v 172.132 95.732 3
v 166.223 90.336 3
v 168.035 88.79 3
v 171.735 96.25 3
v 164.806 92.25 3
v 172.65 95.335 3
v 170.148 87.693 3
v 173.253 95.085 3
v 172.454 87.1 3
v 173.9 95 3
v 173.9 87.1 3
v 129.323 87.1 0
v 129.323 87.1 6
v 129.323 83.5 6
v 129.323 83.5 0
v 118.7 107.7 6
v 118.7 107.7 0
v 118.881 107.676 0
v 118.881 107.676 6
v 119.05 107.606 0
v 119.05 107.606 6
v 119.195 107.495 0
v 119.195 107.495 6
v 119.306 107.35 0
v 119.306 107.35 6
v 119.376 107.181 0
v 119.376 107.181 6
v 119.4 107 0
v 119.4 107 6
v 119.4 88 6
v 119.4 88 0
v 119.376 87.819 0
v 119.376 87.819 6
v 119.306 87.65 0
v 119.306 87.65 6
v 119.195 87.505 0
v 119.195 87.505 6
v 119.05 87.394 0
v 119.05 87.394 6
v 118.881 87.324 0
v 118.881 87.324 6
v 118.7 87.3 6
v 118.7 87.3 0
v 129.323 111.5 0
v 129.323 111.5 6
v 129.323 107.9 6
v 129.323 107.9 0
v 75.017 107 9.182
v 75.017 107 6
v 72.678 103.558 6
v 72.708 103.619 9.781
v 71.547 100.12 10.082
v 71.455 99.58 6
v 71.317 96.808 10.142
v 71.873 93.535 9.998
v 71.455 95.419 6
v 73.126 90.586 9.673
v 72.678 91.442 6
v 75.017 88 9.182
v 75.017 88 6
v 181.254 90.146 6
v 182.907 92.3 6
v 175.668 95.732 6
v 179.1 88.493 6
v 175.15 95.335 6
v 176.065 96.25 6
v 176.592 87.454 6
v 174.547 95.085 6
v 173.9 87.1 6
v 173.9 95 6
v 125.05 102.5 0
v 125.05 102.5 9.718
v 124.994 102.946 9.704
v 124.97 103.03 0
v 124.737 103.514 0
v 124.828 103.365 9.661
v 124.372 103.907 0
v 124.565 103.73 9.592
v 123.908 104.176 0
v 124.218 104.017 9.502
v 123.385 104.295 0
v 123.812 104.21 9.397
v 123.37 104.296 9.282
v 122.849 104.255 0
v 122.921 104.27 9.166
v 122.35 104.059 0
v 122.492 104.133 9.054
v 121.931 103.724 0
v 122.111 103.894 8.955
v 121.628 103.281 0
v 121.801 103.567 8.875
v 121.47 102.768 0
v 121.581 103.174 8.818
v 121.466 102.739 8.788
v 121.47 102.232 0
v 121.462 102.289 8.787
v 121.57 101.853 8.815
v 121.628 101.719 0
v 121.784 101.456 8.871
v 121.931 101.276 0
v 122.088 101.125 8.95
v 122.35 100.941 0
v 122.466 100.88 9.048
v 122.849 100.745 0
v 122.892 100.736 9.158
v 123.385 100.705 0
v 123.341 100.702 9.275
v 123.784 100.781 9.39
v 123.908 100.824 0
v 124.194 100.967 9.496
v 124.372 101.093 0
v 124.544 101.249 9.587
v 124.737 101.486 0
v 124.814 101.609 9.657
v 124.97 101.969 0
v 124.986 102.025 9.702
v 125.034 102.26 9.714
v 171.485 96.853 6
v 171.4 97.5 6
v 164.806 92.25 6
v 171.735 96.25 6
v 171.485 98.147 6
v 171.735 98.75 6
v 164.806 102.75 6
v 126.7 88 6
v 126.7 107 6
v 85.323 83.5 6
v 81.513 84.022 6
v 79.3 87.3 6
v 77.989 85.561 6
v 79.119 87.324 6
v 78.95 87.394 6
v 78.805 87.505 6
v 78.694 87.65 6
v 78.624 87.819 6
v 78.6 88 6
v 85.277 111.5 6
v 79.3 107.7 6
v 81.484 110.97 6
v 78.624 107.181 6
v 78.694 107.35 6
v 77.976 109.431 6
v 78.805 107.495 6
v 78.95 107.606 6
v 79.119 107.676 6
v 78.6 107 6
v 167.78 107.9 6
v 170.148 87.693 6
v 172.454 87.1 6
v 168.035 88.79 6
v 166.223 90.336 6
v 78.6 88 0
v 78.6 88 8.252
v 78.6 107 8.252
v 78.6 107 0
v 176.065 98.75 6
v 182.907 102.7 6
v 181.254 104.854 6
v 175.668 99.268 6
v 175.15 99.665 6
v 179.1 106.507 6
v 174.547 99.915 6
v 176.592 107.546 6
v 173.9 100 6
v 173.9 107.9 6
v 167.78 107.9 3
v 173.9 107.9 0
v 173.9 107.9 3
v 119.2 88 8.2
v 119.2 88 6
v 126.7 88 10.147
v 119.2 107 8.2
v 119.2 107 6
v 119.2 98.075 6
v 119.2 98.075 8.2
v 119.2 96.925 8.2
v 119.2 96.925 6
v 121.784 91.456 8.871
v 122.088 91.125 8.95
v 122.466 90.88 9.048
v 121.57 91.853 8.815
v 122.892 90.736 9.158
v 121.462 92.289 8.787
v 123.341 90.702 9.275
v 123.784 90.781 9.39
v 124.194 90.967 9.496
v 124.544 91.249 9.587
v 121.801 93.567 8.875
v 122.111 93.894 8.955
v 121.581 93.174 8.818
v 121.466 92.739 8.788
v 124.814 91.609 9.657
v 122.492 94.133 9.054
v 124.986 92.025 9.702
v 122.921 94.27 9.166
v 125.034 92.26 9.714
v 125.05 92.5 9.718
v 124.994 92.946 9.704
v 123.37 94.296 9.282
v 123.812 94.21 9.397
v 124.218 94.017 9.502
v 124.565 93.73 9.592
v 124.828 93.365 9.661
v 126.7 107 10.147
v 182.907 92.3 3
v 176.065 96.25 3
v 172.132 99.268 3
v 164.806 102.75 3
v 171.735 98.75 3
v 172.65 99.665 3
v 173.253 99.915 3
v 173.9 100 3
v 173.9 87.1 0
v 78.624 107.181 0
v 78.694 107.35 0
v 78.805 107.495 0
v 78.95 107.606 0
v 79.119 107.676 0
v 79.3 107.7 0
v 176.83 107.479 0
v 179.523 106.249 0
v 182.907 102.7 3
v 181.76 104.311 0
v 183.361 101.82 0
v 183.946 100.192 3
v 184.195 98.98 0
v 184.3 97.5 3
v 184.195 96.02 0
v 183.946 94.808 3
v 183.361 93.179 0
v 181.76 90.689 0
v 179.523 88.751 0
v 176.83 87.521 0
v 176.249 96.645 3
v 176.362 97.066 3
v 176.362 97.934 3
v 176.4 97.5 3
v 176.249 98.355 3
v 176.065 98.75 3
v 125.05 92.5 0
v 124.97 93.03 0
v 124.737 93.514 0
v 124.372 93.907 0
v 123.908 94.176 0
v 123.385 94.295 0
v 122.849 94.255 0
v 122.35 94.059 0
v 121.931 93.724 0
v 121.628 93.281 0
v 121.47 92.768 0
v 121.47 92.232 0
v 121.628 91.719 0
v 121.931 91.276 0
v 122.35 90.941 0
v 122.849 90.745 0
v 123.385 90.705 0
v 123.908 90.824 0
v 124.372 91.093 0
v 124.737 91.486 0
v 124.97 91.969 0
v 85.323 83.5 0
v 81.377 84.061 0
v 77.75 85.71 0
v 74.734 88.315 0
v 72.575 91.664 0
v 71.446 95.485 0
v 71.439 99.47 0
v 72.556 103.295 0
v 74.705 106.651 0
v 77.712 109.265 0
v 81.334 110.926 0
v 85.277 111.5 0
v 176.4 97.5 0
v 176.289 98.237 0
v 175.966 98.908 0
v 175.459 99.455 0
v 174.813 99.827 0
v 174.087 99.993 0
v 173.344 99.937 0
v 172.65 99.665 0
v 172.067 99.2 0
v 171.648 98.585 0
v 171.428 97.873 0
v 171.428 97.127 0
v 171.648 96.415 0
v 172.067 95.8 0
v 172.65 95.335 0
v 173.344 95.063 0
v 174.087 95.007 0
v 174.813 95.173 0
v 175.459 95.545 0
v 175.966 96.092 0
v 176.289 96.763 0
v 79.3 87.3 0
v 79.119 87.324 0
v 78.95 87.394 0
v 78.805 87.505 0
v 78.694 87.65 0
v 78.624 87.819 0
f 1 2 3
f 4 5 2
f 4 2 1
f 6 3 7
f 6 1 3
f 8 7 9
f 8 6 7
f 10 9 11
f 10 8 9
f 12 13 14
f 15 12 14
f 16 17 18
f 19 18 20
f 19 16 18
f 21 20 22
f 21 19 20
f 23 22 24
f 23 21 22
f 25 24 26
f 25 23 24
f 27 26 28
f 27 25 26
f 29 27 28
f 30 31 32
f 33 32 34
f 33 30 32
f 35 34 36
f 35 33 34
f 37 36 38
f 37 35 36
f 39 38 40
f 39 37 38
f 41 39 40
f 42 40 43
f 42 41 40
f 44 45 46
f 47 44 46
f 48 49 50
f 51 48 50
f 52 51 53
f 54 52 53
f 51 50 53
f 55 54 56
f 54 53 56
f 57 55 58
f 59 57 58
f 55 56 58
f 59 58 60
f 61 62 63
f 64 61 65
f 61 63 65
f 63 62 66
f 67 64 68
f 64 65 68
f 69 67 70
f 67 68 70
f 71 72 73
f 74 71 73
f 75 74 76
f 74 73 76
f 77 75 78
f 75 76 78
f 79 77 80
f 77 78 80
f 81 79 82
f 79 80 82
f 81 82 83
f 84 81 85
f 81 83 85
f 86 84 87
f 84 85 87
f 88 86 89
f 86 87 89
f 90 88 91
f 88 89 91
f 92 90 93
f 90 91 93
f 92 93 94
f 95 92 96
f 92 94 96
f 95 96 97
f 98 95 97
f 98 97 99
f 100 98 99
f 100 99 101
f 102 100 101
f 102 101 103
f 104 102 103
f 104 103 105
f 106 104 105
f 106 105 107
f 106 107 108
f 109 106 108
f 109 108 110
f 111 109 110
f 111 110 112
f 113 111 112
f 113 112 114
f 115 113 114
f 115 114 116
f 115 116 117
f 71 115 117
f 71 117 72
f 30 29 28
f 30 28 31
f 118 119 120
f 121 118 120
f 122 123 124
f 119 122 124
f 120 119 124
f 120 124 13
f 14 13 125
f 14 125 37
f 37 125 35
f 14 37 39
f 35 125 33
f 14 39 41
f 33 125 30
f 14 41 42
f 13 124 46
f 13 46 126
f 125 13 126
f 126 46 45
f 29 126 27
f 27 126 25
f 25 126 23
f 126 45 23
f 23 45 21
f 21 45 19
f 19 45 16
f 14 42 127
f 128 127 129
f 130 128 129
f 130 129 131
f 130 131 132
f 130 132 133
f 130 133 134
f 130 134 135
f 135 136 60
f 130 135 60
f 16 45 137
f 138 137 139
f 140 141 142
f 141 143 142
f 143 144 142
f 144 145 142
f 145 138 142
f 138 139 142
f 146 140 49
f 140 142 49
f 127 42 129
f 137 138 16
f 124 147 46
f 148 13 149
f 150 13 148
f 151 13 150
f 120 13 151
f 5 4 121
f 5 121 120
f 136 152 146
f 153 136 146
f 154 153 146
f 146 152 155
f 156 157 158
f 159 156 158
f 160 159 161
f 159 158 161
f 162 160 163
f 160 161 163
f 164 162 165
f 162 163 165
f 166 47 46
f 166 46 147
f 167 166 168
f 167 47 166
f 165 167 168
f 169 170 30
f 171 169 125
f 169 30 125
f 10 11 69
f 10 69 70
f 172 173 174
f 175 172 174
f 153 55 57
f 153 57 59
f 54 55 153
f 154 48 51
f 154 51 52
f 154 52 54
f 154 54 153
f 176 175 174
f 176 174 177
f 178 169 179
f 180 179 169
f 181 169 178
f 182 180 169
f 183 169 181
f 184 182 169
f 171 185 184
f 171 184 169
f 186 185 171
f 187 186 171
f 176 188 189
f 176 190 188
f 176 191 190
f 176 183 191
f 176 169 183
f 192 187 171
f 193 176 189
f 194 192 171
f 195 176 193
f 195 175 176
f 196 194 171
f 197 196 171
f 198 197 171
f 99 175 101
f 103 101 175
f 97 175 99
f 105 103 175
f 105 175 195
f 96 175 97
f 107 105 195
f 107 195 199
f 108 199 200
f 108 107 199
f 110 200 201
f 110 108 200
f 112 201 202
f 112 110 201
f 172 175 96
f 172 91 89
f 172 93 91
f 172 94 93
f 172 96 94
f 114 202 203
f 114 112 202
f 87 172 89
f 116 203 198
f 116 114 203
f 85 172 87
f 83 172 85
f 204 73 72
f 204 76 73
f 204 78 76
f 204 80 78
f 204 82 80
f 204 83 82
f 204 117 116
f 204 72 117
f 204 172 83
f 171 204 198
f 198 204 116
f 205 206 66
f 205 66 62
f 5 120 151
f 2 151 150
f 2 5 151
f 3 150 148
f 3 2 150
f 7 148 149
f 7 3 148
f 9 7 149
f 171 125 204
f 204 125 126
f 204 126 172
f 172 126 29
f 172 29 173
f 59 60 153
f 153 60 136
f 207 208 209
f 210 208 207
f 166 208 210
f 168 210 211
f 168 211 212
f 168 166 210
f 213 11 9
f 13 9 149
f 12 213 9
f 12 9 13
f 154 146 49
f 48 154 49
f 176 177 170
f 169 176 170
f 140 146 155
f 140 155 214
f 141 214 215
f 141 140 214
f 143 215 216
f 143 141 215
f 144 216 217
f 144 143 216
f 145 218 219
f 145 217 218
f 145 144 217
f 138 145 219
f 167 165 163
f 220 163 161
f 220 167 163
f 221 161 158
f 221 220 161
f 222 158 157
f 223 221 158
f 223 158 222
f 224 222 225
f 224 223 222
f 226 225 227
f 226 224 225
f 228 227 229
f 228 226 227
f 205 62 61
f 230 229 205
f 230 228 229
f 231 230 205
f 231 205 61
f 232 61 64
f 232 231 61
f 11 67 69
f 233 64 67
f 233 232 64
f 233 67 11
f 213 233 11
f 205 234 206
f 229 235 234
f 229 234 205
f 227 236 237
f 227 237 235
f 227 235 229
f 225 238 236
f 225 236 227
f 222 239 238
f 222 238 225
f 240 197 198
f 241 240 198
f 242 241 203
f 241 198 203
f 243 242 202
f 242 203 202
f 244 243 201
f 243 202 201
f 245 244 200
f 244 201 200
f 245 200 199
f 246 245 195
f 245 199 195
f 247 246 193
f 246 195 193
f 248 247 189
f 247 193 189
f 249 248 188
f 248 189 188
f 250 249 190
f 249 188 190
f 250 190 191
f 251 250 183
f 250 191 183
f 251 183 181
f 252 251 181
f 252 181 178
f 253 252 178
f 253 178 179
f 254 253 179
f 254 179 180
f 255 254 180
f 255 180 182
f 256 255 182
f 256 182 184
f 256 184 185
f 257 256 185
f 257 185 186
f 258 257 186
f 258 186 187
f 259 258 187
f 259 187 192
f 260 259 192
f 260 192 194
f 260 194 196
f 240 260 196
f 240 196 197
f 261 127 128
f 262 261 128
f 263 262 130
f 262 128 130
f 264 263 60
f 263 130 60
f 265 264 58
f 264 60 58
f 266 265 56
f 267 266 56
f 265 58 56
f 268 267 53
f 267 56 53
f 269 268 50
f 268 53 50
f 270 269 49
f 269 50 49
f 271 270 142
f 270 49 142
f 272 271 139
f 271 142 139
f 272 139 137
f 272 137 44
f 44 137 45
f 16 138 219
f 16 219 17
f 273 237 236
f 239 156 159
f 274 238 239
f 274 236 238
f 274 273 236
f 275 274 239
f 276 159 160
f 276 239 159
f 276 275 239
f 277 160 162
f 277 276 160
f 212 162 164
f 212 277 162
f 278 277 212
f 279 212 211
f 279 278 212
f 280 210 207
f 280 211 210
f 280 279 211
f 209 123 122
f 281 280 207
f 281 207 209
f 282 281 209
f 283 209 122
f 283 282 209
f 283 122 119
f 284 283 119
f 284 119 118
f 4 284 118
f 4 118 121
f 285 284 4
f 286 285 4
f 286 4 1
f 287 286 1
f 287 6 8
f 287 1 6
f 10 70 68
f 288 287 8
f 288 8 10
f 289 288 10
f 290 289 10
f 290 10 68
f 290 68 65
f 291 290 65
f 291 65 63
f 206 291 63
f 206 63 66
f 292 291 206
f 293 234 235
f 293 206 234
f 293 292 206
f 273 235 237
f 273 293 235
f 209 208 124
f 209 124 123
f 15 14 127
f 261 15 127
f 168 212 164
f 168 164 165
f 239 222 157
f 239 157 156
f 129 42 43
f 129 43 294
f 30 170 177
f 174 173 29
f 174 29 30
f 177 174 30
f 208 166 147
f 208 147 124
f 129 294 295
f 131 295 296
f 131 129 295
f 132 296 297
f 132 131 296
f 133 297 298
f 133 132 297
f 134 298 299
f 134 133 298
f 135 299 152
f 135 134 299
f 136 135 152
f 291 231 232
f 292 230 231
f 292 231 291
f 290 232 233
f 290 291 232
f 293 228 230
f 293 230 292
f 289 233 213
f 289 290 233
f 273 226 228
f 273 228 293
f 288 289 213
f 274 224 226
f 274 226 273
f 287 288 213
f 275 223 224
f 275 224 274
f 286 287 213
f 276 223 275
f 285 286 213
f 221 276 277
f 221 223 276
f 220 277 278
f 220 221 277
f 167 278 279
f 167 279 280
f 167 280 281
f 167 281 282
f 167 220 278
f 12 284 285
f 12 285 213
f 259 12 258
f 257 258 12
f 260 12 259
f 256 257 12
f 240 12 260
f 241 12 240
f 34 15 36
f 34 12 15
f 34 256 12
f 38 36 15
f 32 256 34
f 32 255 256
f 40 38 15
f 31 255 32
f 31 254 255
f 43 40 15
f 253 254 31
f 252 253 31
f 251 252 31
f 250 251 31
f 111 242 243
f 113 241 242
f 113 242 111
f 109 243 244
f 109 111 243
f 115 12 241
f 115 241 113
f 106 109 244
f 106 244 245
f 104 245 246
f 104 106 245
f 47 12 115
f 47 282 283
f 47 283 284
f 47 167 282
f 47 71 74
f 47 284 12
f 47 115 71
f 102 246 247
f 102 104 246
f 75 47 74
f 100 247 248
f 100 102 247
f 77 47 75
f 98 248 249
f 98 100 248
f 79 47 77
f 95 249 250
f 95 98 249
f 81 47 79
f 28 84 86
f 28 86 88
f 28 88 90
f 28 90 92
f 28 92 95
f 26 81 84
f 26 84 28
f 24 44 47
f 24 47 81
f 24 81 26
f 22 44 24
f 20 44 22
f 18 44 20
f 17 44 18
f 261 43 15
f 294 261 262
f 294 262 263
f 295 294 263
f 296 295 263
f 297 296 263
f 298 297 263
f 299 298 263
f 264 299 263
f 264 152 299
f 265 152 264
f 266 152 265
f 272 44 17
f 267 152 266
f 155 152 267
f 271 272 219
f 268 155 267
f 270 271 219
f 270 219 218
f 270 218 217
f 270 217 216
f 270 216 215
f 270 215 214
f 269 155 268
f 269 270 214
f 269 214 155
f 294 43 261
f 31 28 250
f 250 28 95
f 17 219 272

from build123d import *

# Parameters (mm, degrees)
SKETCH1_R            = 2.5
BOSS_EXTRUDE1_DEPTH  = 6
CUT_EXTRUDE4_START   = -3
CUT_EXTRUDE4_DEPTH   = 3
BOSS_EXTRUDE3_START  = -6
BOSS_EXTRUDE3_DEPTH  = 6
BOSS_EXTRUDE4_DEPTH  = 6
CUT_EXTRUDE8_DEPTH   = 216.487496567
BOSS_EXTRUDE5_REACH  = 217.487
M3_CLEARANCE_HOLE2_D = 3.6
BOSS_EXTRUDE6_REACH  = 217.487


with BuildPart() as part:
    # Sketch1 → Boss-Extrude1 (new body)
    with BuildSketch(Plane.XY):
        with BuildLine():
            Line((173.900000276, 87.099556458), (88.800000276, 87.099467009))
            ThreePointArc((88.800000276, 87.099467009), (78.399532162, 97.499935123), (88.800000276, 107.900403236))
            Line((88.800000276, 107.900403236), (173.900000276, 107.900313787))
            ThreePointArc((173.900000276, 107.900313787), (184.30037894, 97.499940589), (173.900000276, 87.099556458))
        make_face()
        with Locations((88.800000276, 97.499935123)):
            Circle(SKETCH1_R, mode=Mode.SUBTRACT)
        with Locations((173.900000276, 97.499935123)):
            Circle(SKETCH1_R, mode=Mode.SUBTRACT)
    extrude(amount=BOSS_EXTRUDE1_DEPTH)

    # Sketch2 → Cut-Extrude4 (cut)
    with BuildSketch(Plane.XY.offset(6).offset(CUT_EXTRUDE4_START)):
        with BuildLine():
            ThreePointArc((176.065063128, 98.749936261), (176.400000276, 97.499936437), (176.065064442, 96.249936261))
            Line((176.065064442, 96.249936261), (182.993597708, 92.24975057))
            ThreePointArc((182.993597708, 92.24975057), (184.40037894, 97.499940641), (182.993592189, 102.750129234))
            Line((182.993592189, 102.750129234), (176.065063128, 98.749936261))
        make_face()
        with BuildLine():
            ThreePointArc((164.806408362, 92.249741011), (168.649815723, 88.406337691), (173.900005794, 86.999556458))
            Line((173.900005794, 86.999556458), (173.90000159, 94.999935123))
            ThreePointArc((173.90000159, 94.999935123), (172.650001414, 95.334870956), (171.734937423, 96.249933985))
            Line((171.734937423, 96.249933985), (164.806408362, 92.249741011))
        make_face()
        with BuildLine():
            Line((173.899998962, 99.999935123), (173.899994757, 108.000313787))
            Line((173.899994757, 108.000313787), (167.779868906, 107.90032022))
            Line((167.779868906, 107.90032022), (164.806402844, 102.750119676))
            Line((164.806402844, 102.750119676), (171.73493611, 98.749933985))
            ThreePointArc((171.73493611, 98.749933985), (172.649999138, 99.664997975), (173.899998962, 99.999935123))
        make_face()
    extrude(amount=CUT_EXTRUDE4_DEPTH, mode=Mode.SUBTRACT)

    # Sketch4 → Boss-Extrude3 (add)
    with BuildSketch(Plane.XY.offset(6).offset(BOSS_EXTRUDE3_START)):
        with BuildLine():
            Line((85.800000276, 107.900403236), (88.800000276, 107.900403236))
            ThreePointArc((88.800000276, 107.900403236), (78.399532162, 97.499935123), (88.800000276, 87.099467009))
            Line((88.800000276, 87.099467009), (85.800000276, 87.099467009))
            ThreePointArc((85.800000276, 87.099467009), (75.399532162, 97.499935123), (85.800000276, 107.900403236))
        make_face()
    extrude(amount=BOSS_EXTRUDE3_DEPTH)

    # Sketch9 → Boss-Extrude4 (add)
    with BuildSketch(Plane.XY.offset(6)):
        with BuildLine():
            Line((85.2774961, 111.499917036), (129.322504452, 111.499917036))
            Line((129.322504452, 111.499917036), (129.322504452, 83.49995321))
            Line((129.322504452, 83.49995321), (85.322504452, 83.49995321))
            ThreePointArc((85.322504452, 83.49995321), (71.300018363, 97.477430947), (85.2774961, 111.499917036))
        make_face()
    extrude(amount=-BOSS_EXTRUDE4_DEPTH)

    # Sketch8 → Cut-Extrude8 (cut, through all)
    with BuildSketch(Plane.XY.offset(6)):
        with BuildLine():
            Line((78.600000246, 87.999935155), (78.600000306, 106.999935155))
            ThreePointArc((78.600000306, 106.999935155), (78.805025561, 107.494909902), (79.300000309, 107.699935153))
            Line((79.300000309, 107.699935153), (118.700000309, 107.699935027))
            ThreePointArc((118.700000309, 107.699935027), (119.194975055, 107.494909772), (119.400000306, 106.999935025))
            Line((119.400000306, 106.999935025), (119.400000246, 87.999935025))
            ThreePointArc((119.400000246, 87.999935025), (119.194974991, 87.504960279), (118.700000243, 87.299935027))
            Line((118.700000243, 87.299935027), (79.300000243, 87.299935153))
            ThreePointArc((79.300000243, 87.299935153), (78.805025497, 87.504960408), (78.600000246, 87.999935155))
        make_face()
    extrude(amount=-CUT_EXTRUDE8_DEPTH, mode=Mode.SUBTRACT)

    # Boss-Extrude5: up to this plane
    boss_extrude5_end = Plane(origin=(125.750000277, 97.974935005, 9.9), z_dir=(-0.2512185729888078, 8.03898804267201e-10, 0.9679303841627594))
    # Sketch13 → Boss-Extrude5 (add, up to the surface)
    with BuildSketch(Plane.XY.offset(6), mode=Mode.PRIVATE) as boss_extrude5_sk1:
        Polygon((119.200000274, 96.924935025), (119.200000246, 87.999935025), (126.700000306, 87.999935025), (126.700000306, 106.999935025), (119.200000306, 106.999935025), (119.200000278, 98.074935025), align=None)
    boss_extrude5_tool1 = split(extrude(boss_extrude5_sk1.sketch, amount=BOSS_EXTRUDE5_REACH, mode=Mode.PRIVATE), bisect_by=boss_extrude5_end, keep=Keep.BOTH, mode=Mode.PRIVATE)
    add(boss_extrude5_tool1.solids().sort_by_distance((122.95, 97.499935, 6))[0])

    # M3 Clearance Hole2 (through all)
    with Locations(Plane(origin=(0, 0, 0), x_dir=(-1, 0, 0), z_dir=(0, 0, -1))):
        with Locations((-123.250000292, 102.499935013), (-123.25000026, 92.499935013)):
            Hole(M3_CLEARANCE_HOLE2_D / 2)

    # Boss-Extrude6: up to this plane
    boss_extrude6_end = Plane(origin=(72.250000277, 97.974935176, 9.9), z_dir=(0.2512185729888078, -8.038995017974768e-10, 0.9679303841627596))
    # Sketch17 → Boss-Extrude6 (add, up to the surface)
    with BuildSketch(Plane.XY.offset(6), mode=Mode.PRIVATE) as boss_extrude6_sk1:
        with BuildLine():
            Line((75.016518346, 87.999935155), (78.600000246, 87.999935155))
            Line((78.600000246, 87.999935155), (78.600000306, 106.999935155))
            Line((78.600000306, 106.999935155), (75.016518405, 106.999935155))
            ThreePointArc((75.016518405, 106.999935155), (71.300000276, 97.499935166), (75.016518346, 87.999935155))
        make_face()
    boss_extrude6_tool1 = split(extrude(boss_extrude6_sk1.sketch, amount=BOSS_EXTRUDE6_REACH, mode=Mode.PRIVATE), bisect_by=boss_extrude6_end, keep=Keep.BOTH, mode=Mode.PRIVATE)
    add(boss_extrude6_tool1.solids().sort_by_distance((75.437055, 97.499935, 6))[0])


solid = part.part
